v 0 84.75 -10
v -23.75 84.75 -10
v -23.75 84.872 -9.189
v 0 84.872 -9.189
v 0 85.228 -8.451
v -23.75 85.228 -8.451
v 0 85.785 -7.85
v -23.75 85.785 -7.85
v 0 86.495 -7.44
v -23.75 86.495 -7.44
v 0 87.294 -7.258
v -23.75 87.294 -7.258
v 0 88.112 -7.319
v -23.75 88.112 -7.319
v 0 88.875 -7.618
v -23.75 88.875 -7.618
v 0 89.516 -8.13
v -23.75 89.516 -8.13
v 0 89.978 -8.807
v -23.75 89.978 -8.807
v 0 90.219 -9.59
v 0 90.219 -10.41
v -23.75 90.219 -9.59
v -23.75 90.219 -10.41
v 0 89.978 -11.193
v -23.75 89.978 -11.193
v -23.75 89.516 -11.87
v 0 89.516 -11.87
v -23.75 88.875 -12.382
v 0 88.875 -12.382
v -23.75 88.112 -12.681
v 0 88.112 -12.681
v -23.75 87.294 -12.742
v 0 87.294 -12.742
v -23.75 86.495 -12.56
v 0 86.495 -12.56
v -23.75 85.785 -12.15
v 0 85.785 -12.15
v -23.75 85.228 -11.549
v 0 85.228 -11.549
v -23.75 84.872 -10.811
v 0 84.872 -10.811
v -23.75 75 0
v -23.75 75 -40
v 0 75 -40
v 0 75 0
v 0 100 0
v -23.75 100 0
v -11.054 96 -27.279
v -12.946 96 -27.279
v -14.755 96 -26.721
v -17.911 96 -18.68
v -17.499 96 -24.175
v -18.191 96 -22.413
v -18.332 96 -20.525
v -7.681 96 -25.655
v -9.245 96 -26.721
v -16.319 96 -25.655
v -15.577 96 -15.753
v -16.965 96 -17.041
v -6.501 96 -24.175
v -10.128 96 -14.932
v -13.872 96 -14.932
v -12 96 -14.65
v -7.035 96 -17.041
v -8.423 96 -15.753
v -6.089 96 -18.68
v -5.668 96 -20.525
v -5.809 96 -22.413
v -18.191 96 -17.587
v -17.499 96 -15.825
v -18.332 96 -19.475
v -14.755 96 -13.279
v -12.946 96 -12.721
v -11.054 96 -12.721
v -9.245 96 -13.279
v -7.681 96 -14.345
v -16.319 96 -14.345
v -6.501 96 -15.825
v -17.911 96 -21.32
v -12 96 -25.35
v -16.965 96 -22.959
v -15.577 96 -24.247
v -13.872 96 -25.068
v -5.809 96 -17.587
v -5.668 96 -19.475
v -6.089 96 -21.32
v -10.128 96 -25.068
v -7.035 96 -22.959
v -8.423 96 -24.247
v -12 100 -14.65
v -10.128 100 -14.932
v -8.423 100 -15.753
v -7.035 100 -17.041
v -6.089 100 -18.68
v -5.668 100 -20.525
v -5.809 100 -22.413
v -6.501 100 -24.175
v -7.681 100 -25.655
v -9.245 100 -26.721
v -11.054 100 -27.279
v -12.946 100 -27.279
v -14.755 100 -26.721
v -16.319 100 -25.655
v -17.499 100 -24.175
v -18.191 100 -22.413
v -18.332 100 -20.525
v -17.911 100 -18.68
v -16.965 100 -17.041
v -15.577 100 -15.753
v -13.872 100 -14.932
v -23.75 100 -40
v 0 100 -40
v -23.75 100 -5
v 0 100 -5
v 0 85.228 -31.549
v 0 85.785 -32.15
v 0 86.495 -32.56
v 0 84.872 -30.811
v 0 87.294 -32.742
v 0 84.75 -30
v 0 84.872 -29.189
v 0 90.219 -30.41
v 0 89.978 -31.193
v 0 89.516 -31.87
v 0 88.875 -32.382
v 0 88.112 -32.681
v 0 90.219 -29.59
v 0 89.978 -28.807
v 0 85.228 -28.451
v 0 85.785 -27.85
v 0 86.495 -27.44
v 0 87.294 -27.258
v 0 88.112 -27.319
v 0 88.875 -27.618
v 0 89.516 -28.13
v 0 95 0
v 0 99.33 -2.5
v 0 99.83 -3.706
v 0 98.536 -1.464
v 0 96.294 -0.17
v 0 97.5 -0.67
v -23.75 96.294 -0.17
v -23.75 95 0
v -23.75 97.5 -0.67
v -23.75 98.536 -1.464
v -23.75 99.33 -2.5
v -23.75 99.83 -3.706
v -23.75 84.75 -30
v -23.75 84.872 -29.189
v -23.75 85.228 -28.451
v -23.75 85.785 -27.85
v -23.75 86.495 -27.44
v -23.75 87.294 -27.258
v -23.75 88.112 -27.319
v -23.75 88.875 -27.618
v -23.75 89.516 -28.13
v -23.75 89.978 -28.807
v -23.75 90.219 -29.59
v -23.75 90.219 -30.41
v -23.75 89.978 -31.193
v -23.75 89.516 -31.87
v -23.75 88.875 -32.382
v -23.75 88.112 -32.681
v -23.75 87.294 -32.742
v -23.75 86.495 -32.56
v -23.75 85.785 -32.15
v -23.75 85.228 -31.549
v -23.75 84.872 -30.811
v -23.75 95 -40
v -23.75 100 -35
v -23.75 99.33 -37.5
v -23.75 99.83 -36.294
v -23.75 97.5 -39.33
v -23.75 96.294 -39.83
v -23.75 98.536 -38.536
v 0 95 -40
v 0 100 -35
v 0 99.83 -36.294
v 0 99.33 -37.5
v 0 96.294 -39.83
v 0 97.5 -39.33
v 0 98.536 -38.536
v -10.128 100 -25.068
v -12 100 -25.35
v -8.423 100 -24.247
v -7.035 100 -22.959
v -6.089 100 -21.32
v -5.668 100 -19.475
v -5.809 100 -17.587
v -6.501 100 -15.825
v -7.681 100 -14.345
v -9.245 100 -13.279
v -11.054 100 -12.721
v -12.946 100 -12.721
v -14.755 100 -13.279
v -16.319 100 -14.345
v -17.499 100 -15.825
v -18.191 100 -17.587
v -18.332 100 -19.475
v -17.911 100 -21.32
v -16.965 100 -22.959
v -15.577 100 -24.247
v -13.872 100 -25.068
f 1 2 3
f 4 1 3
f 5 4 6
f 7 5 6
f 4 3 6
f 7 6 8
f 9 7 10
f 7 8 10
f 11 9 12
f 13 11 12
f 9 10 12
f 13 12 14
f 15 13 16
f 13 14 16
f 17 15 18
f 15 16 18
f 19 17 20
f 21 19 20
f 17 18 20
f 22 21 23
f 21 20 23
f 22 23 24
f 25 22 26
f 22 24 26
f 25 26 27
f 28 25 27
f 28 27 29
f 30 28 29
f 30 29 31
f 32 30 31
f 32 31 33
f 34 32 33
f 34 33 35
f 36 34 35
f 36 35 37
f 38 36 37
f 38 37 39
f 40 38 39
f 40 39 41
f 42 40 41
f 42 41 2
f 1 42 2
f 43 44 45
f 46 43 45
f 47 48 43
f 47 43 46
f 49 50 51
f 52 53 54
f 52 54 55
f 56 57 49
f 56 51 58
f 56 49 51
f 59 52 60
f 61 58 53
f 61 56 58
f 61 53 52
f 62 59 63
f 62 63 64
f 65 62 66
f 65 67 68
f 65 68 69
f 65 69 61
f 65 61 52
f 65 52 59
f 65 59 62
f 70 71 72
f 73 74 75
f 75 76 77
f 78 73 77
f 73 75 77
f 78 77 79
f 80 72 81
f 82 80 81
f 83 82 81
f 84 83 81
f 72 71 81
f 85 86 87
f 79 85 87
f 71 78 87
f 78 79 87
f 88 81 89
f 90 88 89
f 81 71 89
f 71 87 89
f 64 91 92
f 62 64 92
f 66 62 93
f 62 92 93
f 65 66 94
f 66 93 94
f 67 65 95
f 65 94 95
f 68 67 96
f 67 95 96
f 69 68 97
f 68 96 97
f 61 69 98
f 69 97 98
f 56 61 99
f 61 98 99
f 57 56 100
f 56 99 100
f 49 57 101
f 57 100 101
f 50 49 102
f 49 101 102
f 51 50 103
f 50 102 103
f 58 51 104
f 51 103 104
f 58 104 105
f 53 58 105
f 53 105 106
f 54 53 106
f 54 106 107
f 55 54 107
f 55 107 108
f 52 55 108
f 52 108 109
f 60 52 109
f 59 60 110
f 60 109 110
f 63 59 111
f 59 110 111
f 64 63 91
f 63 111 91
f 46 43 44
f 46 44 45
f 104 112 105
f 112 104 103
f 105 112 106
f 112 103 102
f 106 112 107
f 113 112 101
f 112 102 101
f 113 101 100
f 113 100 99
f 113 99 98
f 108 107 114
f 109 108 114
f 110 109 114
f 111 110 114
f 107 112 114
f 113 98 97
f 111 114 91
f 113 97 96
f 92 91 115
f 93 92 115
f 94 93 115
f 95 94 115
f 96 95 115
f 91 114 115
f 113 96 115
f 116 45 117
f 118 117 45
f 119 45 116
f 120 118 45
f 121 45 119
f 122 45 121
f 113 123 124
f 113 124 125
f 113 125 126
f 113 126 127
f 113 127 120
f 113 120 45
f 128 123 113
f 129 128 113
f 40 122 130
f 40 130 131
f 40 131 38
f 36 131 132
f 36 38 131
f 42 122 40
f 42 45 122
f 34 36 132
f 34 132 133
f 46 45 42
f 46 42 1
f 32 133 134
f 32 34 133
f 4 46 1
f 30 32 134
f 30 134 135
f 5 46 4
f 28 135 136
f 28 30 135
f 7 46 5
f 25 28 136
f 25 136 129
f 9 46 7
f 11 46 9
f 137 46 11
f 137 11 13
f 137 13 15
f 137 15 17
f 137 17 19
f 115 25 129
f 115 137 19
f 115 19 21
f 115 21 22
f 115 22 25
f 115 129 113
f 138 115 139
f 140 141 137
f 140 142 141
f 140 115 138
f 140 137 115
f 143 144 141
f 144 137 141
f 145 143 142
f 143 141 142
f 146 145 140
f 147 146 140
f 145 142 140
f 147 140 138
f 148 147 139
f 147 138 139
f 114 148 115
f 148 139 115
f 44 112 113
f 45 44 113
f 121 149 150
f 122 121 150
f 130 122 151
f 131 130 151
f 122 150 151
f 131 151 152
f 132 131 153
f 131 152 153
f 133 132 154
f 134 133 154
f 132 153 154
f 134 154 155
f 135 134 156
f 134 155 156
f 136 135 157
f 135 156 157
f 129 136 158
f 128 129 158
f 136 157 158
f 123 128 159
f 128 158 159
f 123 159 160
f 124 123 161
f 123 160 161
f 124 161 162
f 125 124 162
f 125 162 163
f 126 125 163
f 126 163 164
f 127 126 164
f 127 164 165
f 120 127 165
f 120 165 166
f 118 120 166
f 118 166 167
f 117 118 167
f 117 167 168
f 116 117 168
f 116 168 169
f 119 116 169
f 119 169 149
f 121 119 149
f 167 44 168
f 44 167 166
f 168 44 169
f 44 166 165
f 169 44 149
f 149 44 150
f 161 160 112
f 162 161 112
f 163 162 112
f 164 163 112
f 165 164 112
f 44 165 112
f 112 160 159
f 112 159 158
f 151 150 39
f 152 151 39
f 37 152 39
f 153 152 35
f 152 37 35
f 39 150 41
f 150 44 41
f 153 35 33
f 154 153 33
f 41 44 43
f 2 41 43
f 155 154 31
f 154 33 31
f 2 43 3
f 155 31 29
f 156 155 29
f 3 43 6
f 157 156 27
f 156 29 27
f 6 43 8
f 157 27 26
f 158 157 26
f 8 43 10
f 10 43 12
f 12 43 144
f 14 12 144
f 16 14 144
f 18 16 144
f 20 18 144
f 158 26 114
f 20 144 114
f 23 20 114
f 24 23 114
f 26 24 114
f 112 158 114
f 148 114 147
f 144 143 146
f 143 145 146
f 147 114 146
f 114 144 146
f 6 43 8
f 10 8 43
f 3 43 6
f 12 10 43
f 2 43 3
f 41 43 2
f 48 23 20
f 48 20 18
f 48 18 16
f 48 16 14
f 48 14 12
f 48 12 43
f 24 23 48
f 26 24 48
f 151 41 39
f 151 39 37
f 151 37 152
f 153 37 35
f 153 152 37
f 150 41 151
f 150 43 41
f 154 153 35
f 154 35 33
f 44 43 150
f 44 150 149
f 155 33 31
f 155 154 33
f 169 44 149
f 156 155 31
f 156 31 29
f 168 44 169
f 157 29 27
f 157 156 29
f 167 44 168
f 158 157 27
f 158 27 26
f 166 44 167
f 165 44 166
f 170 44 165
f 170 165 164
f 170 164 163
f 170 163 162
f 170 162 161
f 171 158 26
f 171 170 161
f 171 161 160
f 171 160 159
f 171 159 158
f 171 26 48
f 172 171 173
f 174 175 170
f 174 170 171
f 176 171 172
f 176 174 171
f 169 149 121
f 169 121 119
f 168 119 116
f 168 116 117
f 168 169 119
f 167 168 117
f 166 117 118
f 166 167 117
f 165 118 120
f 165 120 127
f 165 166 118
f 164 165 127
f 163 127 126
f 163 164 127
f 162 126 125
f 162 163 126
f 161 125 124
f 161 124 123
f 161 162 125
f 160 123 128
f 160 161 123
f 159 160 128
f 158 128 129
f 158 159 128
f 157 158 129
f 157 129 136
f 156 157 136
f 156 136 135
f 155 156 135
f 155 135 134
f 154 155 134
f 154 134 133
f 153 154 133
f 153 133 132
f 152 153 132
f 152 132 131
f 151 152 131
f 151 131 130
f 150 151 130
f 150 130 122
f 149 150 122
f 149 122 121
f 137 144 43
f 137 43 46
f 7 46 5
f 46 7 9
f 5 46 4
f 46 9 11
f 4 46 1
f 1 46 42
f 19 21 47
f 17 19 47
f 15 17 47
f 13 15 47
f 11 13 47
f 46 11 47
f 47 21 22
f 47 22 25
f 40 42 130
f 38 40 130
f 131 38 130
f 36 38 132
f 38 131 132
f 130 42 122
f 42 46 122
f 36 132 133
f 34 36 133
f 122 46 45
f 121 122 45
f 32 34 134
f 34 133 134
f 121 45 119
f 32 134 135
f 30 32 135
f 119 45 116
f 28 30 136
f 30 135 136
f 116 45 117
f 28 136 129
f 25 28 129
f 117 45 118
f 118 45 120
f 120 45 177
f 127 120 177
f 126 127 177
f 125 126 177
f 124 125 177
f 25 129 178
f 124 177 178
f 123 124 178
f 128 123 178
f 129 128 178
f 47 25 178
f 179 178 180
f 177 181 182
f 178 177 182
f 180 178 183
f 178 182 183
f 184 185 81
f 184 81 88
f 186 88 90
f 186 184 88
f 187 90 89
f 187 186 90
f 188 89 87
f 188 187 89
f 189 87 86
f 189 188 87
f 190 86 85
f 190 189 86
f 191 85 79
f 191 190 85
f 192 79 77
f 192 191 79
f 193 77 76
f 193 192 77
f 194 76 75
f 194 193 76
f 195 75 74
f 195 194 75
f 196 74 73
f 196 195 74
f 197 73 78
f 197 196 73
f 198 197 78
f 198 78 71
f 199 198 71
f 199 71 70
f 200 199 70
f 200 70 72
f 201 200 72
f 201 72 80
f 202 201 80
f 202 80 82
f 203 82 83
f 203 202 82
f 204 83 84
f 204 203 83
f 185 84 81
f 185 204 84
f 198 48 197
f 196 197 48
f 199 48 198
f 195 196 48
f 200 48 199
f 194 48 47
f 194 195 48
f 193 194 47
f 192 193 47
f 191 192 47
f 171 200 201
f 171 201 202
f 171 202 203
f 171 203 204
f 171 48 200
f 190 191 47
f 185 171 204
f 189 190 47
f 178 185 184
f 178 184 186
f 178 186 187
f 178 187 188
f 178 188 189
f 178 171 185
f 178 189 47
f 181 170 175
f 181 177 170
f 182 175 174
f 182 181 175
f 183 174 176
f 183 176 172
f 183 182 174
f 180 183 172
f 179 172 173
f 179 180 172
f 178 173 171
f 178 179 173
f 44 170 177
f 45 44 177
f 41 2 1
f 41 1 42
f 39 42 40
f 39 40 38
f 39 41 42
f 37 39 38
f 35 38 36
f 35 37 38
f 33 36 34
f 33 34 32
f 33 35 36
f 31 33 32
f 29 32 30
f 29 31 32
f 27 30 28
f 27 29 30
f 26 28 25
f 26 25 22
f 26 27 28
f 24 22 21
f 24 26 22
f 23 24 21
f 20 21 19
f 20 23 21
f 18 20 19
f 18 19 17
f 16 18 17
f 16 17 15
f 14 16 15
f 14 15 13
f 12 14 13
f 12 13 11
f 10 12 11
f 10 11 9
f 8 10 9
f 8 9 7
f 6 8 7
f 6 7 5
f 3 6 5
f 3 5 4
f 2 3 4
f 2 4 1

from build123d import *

# Parameters (mm, degrees)
ESQUISSE2_W             = 23.75
ESQUISSE2_H             = 25
BOSS_EXTRU_1_DEPTH      = 40
ESQUISSE3_R             = 6.35
ENL_V_MAT_EXTRU_1_DEPTH = 4
D_GAGEMENT_M51_D        = 5.5
CONG_1_R                = 5


with BuildPart() as part:
    # Esquisse2 → Boss.-Extru.1 (new body)
    with BuildSketch(Plane.XY):
        with Locations((-11.875, 87.5)):
            Rectangle(ESQUISSE2_W, ESQUISSE2_H)
    extrude(amount=-BOSS_EXTRU_1_DEPTH)

    # Esquisse3 → Enlèv. mat.-Extru.1 (cut)
    with BuildSketch(Plane(origin=(0, 100, 0), x_dir=(1, 0, 0), z_dir=(0, 1, 0))):
        with Locations(Location((-12, 21, 0), (0, 0, 270))):
            Circle(ESQUISSE3_R)
    extrude(amount=-ENL_V_MAT_EXTRU_1_DEPTH, mode=Mode.SUBTRACT)

    # Dégagement M51 (through all)
    with Locations(Plane(origin=(0, 87.5, -10), x_dir=(0, 1, 0), z_dir=(1, 0, 0))):
        with Locations((0, 0), (0, -20)):
            Hole(D_GAGEMENT_M51_D / 2)

    # Congé1
    cong_1_edges = [part.edges().sort_by_distance(p)[0] for p in [
        (-11.875, 100, 0),
    ]]
    fillet(cong_1_edges, radius=CONG_1_R)


with BuildPart() as body_2:
    # Symétrie1: mirrored copy
    add(part.part.mirror(Plane.XY.offset(-20)))


solid = Compound([part.part, body_2.part])
